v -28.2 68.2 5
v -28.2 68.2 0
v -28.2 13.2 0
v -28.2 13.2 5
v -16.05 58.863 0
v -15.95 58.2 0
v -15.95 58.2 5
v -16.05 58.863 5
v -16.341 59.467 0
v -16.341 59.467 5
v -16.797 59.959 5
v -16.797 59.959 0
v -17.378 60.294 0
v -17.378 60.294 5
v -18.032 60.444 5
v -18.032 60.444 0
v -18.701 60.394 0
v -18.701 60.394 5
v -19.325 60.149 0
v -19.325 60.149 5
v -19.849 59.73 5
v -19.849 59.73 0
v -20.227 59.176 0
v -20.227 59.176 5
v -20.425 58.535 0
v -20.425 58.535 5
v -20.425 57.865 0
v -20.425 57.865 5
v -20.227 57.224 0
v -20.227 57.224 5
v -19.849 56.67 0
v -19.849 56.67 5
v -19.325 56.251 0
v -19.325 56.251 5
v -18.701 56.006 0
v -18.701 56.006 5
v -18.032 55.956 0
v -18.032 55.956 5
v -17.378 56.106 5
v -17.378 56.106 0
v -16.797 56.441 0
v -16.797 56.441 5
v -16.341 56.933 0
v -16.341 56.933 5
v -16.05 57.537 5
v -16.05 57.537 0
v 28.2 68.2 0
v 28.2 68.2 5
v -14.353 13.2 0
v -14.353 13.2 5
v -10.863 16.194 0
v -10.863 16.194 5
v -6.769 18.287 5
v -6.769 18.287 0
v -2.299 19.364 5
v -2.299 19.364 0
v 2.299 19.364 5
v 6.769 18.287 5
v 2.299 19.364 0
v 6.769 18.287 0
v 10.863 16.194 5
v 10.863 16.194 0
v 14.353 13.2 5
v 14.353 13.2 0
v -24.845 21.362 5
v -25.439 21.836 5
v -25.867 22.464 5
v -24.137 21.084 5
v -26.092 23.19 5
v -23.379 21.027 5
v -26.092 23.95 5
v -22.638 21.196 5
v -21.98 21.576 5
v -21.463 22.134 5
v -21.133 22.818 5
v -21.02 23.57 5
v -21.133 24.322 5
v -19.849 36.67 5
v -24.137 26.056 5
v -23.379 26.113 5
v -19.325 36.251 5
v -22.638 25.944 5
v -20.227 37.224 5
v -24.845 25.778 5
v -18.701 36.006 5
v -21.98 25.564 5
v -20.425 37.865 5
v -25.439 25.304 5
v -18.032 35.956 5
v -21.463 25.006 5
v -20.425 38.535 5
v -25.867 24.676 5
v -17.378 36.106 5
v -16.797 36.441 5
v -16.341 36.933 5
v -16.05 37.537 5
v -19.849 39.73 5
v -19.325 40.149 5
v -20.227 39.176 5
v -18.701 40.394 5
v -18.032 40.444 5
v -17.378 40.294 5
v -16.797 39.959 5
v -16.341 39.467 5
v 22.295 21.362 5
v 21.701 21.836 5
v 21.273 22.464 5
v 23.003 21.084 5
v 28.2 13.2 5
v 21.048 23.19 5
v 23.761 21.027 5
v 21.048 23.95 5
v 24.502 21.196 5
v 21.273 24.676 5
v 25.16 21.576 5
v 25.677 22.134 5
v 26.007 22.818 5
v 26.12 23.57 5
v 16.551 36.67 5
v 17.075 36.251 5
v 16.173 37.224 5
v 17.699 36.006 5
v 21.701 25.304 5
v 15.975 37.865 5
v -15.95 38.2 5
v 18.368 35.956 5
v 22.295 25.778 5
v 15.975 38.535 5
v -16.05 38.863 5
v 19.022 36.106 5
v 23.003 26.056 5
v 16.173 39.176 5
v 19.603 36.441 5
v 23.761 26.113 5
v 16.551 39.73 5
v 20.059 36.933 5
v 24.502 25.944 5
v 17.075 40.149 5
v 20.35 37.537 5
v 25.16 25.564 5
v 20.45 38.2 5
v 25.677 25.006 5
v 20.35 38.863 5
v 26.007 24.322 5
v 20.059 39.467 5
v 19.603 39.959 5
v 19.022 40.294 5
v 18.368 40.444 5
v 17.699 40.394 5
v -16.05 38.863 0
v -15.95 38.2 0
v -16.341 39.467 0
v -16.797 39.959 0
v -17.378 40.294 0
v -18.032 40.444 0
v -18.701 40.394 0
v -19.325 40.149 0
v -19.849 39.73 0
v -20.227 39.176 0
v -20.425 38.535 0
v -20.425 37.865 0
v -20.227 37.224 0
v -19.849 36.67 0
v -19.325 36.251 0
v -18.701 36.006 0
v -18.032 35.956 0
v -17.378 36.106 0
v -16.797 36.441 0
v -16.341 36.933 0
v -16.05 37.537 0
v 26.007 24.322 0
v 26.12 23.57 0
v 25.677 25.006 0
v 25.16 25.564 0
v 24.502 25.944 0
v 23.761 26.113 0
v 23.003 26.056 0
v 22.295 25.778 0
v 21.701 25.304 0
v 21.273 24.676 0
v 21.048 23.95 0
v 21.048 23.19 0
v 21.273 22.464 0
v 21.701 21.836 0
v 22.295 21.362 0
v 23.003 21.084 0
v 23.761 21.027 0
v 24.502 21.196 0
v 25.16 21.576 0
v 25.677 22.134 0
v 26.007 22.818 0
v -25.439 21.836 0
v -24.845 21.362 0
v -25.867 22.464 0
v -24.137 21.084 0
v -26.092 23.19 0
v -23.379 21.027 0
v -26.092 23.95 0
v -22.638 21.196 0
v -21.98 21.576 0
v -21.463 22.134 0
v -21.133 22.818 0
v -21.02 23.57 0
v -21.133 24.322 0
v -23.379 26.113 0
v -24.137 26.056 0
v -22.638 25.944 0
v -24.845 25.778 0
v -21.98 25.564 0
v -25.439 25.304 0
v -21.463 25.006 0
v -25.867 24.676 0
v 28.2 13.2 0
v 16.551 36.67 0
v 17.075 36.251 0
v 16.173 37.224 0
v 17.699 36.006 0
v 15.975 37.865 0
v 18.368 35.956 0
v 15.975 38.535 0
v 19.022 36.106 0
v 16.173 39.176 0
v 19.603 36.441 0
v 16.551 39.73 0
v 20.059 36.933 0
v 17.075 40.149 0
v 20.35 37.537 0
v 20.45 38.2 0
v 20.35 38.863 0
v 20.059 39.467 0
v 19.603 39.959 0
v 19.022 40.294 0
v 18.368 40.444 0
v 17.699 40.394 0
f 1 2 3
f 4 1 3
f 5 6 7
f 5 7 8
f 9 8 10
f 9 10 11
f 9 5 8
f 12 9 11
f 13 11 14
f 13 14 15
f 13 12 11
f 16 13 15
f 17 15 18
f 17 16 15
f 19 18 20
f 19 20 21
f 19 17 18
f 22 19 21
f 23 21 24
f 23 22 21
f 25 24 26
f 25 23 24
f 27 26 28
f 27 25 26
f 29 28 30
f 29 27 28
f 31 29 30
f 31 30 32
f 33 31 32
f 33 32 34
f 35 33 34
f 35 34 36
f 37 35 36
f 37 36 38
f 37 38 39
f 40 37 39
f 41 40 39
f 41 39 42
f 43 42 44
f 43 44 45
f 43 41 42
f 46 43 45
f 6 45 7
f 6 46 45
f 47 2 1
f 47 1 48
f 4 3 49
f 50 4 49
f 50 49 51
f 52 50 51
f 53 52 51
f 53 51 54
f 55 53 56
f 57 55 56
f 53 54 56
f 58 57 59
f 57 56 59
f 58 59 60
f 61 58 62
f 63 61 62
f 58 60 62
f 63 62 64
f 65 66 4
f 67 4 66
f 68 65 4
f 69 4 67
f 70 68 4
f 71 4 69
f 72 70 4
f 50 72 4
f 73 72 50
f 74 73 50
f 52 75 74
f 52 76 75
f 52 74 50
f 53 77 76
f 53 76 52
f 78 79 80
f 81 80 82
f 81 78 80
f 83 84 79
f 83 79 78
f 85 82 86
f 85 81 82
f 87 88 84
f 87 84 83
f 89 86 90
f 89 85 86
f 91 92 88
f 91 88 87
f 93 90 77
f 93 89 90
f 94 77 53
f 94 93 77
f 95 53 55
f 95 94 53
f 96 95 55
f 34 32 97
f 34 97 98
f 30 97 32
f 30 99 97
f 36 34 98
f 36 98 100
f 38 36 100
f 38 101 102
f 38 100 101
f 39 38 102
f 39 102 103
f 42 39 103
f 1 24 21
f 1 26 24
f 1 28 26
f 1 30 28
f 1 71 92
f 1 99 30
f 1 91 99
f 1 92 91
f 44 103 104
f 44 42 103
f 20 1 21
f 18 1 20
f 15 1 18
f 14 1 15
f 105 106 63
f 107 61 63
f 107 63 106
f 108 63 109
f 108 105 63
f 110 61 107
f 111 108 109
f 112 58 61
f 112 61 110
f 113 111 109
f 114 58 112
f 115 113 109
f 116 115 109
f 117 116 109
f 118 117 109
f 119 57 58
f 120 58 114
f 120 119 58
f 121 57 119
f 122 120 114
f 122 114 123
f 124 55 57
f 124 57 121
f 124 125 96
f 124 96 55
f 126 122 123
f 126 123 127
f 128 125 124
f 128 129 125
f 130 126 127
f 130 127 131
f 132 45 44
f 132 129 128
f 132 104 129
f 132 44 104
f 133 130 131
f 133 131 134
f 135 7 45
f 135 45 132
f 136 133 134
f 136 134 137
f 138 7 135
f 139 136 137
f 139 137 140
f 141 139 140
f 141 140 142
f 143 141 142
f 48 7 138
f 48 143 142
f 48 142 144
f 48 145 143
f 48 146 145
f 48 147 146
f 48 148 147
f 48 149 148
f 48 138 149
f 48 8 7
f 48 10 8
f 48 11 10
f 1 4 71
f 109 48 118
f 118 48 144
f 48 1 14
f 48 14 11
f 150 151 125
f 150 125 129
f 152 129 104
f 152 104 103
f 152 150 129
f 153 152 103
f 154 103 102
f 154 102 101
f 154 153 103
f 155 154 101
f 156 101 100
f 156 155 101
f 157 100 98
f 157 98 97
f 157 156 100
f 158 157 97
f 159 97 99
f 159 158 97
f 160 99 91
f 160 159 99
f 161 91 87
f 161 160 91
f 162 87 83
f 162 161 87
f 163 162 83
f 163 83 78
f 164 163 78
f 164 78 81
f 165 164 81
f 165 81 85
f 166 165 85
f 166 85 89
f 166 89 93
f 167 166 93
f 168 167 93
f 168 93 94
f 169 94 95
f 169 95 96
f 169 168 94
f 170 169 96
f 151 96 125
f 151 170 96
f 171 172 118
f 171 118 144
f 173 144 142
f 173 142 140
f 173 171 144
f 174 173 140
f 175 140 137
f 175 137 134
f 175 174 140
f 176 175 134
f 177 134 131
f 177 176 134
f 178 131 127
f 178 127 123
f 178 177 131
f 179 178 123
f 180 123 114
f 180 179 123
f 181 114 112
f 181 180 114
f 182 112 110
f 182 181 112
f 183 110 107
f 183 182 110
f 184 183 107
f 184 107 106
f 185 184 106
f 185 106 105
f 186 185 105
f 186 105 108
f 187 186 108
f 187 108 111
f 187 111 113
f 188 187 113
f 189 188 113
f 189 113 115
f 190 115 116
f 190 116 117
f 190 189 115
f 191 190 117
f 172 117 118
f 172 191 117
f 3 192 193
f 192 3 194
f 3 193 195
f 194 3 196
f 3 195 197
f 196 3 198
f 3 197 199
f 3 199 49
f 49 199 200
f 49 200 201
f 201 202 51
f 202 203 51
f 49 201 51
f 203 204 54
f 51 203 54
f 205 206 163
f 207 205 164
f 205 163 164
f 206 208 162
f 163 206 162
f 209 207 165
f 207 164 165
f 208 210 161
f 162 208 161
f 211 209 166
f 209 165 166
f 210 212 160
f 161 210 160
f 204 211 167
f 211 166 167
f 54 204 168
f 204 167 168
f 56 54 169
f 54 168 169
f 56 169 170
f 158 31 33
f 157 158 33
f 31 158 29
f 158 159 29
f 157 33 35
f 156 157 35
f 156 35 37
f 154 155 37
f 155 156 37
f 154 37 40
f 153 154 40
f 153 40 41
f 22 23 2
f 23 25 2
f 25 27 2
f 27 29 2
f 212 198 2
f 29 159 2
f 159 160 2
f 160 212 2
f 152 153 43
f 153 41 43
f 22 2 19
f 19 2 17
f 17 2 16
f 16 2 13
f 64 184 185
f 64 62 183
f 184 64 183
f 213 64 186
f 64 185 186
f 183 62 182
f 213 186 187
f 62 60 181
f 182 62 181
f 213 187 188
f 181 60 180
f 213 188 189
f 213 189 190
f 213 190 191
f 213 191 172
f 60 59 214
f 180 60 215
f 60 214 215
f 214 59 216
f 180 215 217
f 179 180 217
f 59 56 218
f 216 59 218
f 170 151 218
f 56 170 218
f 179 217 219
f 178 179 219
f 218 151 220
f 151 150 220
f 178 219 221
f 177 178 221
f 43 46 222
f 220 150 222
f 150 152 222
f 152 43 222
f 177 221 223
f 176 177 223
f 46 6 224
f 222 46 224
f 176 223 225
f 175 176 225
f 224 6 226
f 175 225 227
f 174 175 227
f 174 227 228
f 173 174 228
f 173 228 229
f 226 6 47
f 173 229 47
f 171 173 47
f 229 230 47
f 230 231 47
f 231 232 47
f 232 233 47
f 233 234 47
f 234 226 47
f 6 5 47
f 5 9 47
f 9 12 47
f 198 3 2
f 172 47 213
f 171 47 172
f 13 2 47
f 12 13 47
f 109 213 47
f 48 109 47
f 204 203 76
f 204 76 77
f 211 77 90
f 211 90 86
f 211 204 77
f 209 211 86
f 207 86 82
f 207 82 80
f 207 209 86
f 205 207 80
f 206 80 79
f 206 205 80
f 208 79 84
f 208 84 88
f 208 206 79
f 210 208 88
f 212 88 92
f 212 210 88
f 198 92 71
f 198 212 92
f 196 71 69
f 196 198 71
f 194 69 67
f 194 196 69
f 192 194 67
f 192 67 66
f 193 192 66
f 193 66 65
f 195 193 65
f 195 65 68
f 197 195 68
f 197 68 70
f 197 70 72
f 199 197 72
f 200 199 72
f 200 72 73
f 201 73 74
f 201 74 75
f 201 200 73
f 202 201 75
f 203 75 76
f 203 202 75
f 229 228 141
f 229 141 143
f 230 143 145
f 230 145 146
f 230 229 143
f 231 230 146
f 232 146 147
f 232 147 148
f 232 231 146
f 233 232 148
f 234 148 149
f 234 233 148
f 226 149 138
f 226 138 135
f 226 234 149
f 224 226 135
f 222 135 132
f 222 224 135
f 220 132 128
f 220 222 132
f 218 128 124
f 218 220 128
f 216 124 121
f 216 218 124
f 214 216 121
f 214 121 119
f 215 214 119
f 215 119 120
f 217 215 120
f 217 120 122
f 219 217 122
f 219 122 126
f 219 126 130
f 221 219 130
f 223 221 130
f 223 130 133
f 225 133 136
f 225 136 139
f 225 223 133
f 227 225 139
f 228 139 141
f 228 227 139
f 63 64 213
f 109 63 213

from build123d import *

# Parameters (mm, degrees)
F0_W     = 56.4
F0_H     = 40
F0_R     = 2.25
F0_R_2   = 2.55
F1_DEPTH = 5


with BuildPart() as f1:
    # F0 (on Top) → F1 (new body)
    with BuildSketch(Plane.XY):
        with Locations((0, 48.2)):
            Rectangle(F0_W, F0_H)
        with Locations((-18.2, 38.2)):
            Circle(F0_R, mode=Mode.SUBTRACT)
        with Locations((18.2, 38.2)):
            Circle(F0_R, mode=Mode.SUBTRACT)
        with Locations((-18.2, 58.2)):
            Circle(F0_R, mode=Mode.SUBTRACT)
        with BuildLine():
            Line((28.2, 28.2), (-28.2, 28.2))
            Line((-28.2, 28.2), (-28.2, 13.2))
            Line((-28.2, 13.2), (-14.353048, 13.2))
            ThreePointArc((-14.353048, 13.2), (0, 19.5), (14.353048, 13.2))
            Line((14.353048, 13.2), (28.2, 13.2))
            Line((28.2, 13.2), (28.2, 28.2))
        make_face()
        with Locations((-23.57, 23.57)):
            Circle(F0_R_2, mode=Mode.SUBTRACT)
        with Locations((23.57, 23.57)):
            Circle(F0_R_2, mode=Mode.SUBTRACT)
    extrude(amount=F1_DEPTH)


solid = f1.part
